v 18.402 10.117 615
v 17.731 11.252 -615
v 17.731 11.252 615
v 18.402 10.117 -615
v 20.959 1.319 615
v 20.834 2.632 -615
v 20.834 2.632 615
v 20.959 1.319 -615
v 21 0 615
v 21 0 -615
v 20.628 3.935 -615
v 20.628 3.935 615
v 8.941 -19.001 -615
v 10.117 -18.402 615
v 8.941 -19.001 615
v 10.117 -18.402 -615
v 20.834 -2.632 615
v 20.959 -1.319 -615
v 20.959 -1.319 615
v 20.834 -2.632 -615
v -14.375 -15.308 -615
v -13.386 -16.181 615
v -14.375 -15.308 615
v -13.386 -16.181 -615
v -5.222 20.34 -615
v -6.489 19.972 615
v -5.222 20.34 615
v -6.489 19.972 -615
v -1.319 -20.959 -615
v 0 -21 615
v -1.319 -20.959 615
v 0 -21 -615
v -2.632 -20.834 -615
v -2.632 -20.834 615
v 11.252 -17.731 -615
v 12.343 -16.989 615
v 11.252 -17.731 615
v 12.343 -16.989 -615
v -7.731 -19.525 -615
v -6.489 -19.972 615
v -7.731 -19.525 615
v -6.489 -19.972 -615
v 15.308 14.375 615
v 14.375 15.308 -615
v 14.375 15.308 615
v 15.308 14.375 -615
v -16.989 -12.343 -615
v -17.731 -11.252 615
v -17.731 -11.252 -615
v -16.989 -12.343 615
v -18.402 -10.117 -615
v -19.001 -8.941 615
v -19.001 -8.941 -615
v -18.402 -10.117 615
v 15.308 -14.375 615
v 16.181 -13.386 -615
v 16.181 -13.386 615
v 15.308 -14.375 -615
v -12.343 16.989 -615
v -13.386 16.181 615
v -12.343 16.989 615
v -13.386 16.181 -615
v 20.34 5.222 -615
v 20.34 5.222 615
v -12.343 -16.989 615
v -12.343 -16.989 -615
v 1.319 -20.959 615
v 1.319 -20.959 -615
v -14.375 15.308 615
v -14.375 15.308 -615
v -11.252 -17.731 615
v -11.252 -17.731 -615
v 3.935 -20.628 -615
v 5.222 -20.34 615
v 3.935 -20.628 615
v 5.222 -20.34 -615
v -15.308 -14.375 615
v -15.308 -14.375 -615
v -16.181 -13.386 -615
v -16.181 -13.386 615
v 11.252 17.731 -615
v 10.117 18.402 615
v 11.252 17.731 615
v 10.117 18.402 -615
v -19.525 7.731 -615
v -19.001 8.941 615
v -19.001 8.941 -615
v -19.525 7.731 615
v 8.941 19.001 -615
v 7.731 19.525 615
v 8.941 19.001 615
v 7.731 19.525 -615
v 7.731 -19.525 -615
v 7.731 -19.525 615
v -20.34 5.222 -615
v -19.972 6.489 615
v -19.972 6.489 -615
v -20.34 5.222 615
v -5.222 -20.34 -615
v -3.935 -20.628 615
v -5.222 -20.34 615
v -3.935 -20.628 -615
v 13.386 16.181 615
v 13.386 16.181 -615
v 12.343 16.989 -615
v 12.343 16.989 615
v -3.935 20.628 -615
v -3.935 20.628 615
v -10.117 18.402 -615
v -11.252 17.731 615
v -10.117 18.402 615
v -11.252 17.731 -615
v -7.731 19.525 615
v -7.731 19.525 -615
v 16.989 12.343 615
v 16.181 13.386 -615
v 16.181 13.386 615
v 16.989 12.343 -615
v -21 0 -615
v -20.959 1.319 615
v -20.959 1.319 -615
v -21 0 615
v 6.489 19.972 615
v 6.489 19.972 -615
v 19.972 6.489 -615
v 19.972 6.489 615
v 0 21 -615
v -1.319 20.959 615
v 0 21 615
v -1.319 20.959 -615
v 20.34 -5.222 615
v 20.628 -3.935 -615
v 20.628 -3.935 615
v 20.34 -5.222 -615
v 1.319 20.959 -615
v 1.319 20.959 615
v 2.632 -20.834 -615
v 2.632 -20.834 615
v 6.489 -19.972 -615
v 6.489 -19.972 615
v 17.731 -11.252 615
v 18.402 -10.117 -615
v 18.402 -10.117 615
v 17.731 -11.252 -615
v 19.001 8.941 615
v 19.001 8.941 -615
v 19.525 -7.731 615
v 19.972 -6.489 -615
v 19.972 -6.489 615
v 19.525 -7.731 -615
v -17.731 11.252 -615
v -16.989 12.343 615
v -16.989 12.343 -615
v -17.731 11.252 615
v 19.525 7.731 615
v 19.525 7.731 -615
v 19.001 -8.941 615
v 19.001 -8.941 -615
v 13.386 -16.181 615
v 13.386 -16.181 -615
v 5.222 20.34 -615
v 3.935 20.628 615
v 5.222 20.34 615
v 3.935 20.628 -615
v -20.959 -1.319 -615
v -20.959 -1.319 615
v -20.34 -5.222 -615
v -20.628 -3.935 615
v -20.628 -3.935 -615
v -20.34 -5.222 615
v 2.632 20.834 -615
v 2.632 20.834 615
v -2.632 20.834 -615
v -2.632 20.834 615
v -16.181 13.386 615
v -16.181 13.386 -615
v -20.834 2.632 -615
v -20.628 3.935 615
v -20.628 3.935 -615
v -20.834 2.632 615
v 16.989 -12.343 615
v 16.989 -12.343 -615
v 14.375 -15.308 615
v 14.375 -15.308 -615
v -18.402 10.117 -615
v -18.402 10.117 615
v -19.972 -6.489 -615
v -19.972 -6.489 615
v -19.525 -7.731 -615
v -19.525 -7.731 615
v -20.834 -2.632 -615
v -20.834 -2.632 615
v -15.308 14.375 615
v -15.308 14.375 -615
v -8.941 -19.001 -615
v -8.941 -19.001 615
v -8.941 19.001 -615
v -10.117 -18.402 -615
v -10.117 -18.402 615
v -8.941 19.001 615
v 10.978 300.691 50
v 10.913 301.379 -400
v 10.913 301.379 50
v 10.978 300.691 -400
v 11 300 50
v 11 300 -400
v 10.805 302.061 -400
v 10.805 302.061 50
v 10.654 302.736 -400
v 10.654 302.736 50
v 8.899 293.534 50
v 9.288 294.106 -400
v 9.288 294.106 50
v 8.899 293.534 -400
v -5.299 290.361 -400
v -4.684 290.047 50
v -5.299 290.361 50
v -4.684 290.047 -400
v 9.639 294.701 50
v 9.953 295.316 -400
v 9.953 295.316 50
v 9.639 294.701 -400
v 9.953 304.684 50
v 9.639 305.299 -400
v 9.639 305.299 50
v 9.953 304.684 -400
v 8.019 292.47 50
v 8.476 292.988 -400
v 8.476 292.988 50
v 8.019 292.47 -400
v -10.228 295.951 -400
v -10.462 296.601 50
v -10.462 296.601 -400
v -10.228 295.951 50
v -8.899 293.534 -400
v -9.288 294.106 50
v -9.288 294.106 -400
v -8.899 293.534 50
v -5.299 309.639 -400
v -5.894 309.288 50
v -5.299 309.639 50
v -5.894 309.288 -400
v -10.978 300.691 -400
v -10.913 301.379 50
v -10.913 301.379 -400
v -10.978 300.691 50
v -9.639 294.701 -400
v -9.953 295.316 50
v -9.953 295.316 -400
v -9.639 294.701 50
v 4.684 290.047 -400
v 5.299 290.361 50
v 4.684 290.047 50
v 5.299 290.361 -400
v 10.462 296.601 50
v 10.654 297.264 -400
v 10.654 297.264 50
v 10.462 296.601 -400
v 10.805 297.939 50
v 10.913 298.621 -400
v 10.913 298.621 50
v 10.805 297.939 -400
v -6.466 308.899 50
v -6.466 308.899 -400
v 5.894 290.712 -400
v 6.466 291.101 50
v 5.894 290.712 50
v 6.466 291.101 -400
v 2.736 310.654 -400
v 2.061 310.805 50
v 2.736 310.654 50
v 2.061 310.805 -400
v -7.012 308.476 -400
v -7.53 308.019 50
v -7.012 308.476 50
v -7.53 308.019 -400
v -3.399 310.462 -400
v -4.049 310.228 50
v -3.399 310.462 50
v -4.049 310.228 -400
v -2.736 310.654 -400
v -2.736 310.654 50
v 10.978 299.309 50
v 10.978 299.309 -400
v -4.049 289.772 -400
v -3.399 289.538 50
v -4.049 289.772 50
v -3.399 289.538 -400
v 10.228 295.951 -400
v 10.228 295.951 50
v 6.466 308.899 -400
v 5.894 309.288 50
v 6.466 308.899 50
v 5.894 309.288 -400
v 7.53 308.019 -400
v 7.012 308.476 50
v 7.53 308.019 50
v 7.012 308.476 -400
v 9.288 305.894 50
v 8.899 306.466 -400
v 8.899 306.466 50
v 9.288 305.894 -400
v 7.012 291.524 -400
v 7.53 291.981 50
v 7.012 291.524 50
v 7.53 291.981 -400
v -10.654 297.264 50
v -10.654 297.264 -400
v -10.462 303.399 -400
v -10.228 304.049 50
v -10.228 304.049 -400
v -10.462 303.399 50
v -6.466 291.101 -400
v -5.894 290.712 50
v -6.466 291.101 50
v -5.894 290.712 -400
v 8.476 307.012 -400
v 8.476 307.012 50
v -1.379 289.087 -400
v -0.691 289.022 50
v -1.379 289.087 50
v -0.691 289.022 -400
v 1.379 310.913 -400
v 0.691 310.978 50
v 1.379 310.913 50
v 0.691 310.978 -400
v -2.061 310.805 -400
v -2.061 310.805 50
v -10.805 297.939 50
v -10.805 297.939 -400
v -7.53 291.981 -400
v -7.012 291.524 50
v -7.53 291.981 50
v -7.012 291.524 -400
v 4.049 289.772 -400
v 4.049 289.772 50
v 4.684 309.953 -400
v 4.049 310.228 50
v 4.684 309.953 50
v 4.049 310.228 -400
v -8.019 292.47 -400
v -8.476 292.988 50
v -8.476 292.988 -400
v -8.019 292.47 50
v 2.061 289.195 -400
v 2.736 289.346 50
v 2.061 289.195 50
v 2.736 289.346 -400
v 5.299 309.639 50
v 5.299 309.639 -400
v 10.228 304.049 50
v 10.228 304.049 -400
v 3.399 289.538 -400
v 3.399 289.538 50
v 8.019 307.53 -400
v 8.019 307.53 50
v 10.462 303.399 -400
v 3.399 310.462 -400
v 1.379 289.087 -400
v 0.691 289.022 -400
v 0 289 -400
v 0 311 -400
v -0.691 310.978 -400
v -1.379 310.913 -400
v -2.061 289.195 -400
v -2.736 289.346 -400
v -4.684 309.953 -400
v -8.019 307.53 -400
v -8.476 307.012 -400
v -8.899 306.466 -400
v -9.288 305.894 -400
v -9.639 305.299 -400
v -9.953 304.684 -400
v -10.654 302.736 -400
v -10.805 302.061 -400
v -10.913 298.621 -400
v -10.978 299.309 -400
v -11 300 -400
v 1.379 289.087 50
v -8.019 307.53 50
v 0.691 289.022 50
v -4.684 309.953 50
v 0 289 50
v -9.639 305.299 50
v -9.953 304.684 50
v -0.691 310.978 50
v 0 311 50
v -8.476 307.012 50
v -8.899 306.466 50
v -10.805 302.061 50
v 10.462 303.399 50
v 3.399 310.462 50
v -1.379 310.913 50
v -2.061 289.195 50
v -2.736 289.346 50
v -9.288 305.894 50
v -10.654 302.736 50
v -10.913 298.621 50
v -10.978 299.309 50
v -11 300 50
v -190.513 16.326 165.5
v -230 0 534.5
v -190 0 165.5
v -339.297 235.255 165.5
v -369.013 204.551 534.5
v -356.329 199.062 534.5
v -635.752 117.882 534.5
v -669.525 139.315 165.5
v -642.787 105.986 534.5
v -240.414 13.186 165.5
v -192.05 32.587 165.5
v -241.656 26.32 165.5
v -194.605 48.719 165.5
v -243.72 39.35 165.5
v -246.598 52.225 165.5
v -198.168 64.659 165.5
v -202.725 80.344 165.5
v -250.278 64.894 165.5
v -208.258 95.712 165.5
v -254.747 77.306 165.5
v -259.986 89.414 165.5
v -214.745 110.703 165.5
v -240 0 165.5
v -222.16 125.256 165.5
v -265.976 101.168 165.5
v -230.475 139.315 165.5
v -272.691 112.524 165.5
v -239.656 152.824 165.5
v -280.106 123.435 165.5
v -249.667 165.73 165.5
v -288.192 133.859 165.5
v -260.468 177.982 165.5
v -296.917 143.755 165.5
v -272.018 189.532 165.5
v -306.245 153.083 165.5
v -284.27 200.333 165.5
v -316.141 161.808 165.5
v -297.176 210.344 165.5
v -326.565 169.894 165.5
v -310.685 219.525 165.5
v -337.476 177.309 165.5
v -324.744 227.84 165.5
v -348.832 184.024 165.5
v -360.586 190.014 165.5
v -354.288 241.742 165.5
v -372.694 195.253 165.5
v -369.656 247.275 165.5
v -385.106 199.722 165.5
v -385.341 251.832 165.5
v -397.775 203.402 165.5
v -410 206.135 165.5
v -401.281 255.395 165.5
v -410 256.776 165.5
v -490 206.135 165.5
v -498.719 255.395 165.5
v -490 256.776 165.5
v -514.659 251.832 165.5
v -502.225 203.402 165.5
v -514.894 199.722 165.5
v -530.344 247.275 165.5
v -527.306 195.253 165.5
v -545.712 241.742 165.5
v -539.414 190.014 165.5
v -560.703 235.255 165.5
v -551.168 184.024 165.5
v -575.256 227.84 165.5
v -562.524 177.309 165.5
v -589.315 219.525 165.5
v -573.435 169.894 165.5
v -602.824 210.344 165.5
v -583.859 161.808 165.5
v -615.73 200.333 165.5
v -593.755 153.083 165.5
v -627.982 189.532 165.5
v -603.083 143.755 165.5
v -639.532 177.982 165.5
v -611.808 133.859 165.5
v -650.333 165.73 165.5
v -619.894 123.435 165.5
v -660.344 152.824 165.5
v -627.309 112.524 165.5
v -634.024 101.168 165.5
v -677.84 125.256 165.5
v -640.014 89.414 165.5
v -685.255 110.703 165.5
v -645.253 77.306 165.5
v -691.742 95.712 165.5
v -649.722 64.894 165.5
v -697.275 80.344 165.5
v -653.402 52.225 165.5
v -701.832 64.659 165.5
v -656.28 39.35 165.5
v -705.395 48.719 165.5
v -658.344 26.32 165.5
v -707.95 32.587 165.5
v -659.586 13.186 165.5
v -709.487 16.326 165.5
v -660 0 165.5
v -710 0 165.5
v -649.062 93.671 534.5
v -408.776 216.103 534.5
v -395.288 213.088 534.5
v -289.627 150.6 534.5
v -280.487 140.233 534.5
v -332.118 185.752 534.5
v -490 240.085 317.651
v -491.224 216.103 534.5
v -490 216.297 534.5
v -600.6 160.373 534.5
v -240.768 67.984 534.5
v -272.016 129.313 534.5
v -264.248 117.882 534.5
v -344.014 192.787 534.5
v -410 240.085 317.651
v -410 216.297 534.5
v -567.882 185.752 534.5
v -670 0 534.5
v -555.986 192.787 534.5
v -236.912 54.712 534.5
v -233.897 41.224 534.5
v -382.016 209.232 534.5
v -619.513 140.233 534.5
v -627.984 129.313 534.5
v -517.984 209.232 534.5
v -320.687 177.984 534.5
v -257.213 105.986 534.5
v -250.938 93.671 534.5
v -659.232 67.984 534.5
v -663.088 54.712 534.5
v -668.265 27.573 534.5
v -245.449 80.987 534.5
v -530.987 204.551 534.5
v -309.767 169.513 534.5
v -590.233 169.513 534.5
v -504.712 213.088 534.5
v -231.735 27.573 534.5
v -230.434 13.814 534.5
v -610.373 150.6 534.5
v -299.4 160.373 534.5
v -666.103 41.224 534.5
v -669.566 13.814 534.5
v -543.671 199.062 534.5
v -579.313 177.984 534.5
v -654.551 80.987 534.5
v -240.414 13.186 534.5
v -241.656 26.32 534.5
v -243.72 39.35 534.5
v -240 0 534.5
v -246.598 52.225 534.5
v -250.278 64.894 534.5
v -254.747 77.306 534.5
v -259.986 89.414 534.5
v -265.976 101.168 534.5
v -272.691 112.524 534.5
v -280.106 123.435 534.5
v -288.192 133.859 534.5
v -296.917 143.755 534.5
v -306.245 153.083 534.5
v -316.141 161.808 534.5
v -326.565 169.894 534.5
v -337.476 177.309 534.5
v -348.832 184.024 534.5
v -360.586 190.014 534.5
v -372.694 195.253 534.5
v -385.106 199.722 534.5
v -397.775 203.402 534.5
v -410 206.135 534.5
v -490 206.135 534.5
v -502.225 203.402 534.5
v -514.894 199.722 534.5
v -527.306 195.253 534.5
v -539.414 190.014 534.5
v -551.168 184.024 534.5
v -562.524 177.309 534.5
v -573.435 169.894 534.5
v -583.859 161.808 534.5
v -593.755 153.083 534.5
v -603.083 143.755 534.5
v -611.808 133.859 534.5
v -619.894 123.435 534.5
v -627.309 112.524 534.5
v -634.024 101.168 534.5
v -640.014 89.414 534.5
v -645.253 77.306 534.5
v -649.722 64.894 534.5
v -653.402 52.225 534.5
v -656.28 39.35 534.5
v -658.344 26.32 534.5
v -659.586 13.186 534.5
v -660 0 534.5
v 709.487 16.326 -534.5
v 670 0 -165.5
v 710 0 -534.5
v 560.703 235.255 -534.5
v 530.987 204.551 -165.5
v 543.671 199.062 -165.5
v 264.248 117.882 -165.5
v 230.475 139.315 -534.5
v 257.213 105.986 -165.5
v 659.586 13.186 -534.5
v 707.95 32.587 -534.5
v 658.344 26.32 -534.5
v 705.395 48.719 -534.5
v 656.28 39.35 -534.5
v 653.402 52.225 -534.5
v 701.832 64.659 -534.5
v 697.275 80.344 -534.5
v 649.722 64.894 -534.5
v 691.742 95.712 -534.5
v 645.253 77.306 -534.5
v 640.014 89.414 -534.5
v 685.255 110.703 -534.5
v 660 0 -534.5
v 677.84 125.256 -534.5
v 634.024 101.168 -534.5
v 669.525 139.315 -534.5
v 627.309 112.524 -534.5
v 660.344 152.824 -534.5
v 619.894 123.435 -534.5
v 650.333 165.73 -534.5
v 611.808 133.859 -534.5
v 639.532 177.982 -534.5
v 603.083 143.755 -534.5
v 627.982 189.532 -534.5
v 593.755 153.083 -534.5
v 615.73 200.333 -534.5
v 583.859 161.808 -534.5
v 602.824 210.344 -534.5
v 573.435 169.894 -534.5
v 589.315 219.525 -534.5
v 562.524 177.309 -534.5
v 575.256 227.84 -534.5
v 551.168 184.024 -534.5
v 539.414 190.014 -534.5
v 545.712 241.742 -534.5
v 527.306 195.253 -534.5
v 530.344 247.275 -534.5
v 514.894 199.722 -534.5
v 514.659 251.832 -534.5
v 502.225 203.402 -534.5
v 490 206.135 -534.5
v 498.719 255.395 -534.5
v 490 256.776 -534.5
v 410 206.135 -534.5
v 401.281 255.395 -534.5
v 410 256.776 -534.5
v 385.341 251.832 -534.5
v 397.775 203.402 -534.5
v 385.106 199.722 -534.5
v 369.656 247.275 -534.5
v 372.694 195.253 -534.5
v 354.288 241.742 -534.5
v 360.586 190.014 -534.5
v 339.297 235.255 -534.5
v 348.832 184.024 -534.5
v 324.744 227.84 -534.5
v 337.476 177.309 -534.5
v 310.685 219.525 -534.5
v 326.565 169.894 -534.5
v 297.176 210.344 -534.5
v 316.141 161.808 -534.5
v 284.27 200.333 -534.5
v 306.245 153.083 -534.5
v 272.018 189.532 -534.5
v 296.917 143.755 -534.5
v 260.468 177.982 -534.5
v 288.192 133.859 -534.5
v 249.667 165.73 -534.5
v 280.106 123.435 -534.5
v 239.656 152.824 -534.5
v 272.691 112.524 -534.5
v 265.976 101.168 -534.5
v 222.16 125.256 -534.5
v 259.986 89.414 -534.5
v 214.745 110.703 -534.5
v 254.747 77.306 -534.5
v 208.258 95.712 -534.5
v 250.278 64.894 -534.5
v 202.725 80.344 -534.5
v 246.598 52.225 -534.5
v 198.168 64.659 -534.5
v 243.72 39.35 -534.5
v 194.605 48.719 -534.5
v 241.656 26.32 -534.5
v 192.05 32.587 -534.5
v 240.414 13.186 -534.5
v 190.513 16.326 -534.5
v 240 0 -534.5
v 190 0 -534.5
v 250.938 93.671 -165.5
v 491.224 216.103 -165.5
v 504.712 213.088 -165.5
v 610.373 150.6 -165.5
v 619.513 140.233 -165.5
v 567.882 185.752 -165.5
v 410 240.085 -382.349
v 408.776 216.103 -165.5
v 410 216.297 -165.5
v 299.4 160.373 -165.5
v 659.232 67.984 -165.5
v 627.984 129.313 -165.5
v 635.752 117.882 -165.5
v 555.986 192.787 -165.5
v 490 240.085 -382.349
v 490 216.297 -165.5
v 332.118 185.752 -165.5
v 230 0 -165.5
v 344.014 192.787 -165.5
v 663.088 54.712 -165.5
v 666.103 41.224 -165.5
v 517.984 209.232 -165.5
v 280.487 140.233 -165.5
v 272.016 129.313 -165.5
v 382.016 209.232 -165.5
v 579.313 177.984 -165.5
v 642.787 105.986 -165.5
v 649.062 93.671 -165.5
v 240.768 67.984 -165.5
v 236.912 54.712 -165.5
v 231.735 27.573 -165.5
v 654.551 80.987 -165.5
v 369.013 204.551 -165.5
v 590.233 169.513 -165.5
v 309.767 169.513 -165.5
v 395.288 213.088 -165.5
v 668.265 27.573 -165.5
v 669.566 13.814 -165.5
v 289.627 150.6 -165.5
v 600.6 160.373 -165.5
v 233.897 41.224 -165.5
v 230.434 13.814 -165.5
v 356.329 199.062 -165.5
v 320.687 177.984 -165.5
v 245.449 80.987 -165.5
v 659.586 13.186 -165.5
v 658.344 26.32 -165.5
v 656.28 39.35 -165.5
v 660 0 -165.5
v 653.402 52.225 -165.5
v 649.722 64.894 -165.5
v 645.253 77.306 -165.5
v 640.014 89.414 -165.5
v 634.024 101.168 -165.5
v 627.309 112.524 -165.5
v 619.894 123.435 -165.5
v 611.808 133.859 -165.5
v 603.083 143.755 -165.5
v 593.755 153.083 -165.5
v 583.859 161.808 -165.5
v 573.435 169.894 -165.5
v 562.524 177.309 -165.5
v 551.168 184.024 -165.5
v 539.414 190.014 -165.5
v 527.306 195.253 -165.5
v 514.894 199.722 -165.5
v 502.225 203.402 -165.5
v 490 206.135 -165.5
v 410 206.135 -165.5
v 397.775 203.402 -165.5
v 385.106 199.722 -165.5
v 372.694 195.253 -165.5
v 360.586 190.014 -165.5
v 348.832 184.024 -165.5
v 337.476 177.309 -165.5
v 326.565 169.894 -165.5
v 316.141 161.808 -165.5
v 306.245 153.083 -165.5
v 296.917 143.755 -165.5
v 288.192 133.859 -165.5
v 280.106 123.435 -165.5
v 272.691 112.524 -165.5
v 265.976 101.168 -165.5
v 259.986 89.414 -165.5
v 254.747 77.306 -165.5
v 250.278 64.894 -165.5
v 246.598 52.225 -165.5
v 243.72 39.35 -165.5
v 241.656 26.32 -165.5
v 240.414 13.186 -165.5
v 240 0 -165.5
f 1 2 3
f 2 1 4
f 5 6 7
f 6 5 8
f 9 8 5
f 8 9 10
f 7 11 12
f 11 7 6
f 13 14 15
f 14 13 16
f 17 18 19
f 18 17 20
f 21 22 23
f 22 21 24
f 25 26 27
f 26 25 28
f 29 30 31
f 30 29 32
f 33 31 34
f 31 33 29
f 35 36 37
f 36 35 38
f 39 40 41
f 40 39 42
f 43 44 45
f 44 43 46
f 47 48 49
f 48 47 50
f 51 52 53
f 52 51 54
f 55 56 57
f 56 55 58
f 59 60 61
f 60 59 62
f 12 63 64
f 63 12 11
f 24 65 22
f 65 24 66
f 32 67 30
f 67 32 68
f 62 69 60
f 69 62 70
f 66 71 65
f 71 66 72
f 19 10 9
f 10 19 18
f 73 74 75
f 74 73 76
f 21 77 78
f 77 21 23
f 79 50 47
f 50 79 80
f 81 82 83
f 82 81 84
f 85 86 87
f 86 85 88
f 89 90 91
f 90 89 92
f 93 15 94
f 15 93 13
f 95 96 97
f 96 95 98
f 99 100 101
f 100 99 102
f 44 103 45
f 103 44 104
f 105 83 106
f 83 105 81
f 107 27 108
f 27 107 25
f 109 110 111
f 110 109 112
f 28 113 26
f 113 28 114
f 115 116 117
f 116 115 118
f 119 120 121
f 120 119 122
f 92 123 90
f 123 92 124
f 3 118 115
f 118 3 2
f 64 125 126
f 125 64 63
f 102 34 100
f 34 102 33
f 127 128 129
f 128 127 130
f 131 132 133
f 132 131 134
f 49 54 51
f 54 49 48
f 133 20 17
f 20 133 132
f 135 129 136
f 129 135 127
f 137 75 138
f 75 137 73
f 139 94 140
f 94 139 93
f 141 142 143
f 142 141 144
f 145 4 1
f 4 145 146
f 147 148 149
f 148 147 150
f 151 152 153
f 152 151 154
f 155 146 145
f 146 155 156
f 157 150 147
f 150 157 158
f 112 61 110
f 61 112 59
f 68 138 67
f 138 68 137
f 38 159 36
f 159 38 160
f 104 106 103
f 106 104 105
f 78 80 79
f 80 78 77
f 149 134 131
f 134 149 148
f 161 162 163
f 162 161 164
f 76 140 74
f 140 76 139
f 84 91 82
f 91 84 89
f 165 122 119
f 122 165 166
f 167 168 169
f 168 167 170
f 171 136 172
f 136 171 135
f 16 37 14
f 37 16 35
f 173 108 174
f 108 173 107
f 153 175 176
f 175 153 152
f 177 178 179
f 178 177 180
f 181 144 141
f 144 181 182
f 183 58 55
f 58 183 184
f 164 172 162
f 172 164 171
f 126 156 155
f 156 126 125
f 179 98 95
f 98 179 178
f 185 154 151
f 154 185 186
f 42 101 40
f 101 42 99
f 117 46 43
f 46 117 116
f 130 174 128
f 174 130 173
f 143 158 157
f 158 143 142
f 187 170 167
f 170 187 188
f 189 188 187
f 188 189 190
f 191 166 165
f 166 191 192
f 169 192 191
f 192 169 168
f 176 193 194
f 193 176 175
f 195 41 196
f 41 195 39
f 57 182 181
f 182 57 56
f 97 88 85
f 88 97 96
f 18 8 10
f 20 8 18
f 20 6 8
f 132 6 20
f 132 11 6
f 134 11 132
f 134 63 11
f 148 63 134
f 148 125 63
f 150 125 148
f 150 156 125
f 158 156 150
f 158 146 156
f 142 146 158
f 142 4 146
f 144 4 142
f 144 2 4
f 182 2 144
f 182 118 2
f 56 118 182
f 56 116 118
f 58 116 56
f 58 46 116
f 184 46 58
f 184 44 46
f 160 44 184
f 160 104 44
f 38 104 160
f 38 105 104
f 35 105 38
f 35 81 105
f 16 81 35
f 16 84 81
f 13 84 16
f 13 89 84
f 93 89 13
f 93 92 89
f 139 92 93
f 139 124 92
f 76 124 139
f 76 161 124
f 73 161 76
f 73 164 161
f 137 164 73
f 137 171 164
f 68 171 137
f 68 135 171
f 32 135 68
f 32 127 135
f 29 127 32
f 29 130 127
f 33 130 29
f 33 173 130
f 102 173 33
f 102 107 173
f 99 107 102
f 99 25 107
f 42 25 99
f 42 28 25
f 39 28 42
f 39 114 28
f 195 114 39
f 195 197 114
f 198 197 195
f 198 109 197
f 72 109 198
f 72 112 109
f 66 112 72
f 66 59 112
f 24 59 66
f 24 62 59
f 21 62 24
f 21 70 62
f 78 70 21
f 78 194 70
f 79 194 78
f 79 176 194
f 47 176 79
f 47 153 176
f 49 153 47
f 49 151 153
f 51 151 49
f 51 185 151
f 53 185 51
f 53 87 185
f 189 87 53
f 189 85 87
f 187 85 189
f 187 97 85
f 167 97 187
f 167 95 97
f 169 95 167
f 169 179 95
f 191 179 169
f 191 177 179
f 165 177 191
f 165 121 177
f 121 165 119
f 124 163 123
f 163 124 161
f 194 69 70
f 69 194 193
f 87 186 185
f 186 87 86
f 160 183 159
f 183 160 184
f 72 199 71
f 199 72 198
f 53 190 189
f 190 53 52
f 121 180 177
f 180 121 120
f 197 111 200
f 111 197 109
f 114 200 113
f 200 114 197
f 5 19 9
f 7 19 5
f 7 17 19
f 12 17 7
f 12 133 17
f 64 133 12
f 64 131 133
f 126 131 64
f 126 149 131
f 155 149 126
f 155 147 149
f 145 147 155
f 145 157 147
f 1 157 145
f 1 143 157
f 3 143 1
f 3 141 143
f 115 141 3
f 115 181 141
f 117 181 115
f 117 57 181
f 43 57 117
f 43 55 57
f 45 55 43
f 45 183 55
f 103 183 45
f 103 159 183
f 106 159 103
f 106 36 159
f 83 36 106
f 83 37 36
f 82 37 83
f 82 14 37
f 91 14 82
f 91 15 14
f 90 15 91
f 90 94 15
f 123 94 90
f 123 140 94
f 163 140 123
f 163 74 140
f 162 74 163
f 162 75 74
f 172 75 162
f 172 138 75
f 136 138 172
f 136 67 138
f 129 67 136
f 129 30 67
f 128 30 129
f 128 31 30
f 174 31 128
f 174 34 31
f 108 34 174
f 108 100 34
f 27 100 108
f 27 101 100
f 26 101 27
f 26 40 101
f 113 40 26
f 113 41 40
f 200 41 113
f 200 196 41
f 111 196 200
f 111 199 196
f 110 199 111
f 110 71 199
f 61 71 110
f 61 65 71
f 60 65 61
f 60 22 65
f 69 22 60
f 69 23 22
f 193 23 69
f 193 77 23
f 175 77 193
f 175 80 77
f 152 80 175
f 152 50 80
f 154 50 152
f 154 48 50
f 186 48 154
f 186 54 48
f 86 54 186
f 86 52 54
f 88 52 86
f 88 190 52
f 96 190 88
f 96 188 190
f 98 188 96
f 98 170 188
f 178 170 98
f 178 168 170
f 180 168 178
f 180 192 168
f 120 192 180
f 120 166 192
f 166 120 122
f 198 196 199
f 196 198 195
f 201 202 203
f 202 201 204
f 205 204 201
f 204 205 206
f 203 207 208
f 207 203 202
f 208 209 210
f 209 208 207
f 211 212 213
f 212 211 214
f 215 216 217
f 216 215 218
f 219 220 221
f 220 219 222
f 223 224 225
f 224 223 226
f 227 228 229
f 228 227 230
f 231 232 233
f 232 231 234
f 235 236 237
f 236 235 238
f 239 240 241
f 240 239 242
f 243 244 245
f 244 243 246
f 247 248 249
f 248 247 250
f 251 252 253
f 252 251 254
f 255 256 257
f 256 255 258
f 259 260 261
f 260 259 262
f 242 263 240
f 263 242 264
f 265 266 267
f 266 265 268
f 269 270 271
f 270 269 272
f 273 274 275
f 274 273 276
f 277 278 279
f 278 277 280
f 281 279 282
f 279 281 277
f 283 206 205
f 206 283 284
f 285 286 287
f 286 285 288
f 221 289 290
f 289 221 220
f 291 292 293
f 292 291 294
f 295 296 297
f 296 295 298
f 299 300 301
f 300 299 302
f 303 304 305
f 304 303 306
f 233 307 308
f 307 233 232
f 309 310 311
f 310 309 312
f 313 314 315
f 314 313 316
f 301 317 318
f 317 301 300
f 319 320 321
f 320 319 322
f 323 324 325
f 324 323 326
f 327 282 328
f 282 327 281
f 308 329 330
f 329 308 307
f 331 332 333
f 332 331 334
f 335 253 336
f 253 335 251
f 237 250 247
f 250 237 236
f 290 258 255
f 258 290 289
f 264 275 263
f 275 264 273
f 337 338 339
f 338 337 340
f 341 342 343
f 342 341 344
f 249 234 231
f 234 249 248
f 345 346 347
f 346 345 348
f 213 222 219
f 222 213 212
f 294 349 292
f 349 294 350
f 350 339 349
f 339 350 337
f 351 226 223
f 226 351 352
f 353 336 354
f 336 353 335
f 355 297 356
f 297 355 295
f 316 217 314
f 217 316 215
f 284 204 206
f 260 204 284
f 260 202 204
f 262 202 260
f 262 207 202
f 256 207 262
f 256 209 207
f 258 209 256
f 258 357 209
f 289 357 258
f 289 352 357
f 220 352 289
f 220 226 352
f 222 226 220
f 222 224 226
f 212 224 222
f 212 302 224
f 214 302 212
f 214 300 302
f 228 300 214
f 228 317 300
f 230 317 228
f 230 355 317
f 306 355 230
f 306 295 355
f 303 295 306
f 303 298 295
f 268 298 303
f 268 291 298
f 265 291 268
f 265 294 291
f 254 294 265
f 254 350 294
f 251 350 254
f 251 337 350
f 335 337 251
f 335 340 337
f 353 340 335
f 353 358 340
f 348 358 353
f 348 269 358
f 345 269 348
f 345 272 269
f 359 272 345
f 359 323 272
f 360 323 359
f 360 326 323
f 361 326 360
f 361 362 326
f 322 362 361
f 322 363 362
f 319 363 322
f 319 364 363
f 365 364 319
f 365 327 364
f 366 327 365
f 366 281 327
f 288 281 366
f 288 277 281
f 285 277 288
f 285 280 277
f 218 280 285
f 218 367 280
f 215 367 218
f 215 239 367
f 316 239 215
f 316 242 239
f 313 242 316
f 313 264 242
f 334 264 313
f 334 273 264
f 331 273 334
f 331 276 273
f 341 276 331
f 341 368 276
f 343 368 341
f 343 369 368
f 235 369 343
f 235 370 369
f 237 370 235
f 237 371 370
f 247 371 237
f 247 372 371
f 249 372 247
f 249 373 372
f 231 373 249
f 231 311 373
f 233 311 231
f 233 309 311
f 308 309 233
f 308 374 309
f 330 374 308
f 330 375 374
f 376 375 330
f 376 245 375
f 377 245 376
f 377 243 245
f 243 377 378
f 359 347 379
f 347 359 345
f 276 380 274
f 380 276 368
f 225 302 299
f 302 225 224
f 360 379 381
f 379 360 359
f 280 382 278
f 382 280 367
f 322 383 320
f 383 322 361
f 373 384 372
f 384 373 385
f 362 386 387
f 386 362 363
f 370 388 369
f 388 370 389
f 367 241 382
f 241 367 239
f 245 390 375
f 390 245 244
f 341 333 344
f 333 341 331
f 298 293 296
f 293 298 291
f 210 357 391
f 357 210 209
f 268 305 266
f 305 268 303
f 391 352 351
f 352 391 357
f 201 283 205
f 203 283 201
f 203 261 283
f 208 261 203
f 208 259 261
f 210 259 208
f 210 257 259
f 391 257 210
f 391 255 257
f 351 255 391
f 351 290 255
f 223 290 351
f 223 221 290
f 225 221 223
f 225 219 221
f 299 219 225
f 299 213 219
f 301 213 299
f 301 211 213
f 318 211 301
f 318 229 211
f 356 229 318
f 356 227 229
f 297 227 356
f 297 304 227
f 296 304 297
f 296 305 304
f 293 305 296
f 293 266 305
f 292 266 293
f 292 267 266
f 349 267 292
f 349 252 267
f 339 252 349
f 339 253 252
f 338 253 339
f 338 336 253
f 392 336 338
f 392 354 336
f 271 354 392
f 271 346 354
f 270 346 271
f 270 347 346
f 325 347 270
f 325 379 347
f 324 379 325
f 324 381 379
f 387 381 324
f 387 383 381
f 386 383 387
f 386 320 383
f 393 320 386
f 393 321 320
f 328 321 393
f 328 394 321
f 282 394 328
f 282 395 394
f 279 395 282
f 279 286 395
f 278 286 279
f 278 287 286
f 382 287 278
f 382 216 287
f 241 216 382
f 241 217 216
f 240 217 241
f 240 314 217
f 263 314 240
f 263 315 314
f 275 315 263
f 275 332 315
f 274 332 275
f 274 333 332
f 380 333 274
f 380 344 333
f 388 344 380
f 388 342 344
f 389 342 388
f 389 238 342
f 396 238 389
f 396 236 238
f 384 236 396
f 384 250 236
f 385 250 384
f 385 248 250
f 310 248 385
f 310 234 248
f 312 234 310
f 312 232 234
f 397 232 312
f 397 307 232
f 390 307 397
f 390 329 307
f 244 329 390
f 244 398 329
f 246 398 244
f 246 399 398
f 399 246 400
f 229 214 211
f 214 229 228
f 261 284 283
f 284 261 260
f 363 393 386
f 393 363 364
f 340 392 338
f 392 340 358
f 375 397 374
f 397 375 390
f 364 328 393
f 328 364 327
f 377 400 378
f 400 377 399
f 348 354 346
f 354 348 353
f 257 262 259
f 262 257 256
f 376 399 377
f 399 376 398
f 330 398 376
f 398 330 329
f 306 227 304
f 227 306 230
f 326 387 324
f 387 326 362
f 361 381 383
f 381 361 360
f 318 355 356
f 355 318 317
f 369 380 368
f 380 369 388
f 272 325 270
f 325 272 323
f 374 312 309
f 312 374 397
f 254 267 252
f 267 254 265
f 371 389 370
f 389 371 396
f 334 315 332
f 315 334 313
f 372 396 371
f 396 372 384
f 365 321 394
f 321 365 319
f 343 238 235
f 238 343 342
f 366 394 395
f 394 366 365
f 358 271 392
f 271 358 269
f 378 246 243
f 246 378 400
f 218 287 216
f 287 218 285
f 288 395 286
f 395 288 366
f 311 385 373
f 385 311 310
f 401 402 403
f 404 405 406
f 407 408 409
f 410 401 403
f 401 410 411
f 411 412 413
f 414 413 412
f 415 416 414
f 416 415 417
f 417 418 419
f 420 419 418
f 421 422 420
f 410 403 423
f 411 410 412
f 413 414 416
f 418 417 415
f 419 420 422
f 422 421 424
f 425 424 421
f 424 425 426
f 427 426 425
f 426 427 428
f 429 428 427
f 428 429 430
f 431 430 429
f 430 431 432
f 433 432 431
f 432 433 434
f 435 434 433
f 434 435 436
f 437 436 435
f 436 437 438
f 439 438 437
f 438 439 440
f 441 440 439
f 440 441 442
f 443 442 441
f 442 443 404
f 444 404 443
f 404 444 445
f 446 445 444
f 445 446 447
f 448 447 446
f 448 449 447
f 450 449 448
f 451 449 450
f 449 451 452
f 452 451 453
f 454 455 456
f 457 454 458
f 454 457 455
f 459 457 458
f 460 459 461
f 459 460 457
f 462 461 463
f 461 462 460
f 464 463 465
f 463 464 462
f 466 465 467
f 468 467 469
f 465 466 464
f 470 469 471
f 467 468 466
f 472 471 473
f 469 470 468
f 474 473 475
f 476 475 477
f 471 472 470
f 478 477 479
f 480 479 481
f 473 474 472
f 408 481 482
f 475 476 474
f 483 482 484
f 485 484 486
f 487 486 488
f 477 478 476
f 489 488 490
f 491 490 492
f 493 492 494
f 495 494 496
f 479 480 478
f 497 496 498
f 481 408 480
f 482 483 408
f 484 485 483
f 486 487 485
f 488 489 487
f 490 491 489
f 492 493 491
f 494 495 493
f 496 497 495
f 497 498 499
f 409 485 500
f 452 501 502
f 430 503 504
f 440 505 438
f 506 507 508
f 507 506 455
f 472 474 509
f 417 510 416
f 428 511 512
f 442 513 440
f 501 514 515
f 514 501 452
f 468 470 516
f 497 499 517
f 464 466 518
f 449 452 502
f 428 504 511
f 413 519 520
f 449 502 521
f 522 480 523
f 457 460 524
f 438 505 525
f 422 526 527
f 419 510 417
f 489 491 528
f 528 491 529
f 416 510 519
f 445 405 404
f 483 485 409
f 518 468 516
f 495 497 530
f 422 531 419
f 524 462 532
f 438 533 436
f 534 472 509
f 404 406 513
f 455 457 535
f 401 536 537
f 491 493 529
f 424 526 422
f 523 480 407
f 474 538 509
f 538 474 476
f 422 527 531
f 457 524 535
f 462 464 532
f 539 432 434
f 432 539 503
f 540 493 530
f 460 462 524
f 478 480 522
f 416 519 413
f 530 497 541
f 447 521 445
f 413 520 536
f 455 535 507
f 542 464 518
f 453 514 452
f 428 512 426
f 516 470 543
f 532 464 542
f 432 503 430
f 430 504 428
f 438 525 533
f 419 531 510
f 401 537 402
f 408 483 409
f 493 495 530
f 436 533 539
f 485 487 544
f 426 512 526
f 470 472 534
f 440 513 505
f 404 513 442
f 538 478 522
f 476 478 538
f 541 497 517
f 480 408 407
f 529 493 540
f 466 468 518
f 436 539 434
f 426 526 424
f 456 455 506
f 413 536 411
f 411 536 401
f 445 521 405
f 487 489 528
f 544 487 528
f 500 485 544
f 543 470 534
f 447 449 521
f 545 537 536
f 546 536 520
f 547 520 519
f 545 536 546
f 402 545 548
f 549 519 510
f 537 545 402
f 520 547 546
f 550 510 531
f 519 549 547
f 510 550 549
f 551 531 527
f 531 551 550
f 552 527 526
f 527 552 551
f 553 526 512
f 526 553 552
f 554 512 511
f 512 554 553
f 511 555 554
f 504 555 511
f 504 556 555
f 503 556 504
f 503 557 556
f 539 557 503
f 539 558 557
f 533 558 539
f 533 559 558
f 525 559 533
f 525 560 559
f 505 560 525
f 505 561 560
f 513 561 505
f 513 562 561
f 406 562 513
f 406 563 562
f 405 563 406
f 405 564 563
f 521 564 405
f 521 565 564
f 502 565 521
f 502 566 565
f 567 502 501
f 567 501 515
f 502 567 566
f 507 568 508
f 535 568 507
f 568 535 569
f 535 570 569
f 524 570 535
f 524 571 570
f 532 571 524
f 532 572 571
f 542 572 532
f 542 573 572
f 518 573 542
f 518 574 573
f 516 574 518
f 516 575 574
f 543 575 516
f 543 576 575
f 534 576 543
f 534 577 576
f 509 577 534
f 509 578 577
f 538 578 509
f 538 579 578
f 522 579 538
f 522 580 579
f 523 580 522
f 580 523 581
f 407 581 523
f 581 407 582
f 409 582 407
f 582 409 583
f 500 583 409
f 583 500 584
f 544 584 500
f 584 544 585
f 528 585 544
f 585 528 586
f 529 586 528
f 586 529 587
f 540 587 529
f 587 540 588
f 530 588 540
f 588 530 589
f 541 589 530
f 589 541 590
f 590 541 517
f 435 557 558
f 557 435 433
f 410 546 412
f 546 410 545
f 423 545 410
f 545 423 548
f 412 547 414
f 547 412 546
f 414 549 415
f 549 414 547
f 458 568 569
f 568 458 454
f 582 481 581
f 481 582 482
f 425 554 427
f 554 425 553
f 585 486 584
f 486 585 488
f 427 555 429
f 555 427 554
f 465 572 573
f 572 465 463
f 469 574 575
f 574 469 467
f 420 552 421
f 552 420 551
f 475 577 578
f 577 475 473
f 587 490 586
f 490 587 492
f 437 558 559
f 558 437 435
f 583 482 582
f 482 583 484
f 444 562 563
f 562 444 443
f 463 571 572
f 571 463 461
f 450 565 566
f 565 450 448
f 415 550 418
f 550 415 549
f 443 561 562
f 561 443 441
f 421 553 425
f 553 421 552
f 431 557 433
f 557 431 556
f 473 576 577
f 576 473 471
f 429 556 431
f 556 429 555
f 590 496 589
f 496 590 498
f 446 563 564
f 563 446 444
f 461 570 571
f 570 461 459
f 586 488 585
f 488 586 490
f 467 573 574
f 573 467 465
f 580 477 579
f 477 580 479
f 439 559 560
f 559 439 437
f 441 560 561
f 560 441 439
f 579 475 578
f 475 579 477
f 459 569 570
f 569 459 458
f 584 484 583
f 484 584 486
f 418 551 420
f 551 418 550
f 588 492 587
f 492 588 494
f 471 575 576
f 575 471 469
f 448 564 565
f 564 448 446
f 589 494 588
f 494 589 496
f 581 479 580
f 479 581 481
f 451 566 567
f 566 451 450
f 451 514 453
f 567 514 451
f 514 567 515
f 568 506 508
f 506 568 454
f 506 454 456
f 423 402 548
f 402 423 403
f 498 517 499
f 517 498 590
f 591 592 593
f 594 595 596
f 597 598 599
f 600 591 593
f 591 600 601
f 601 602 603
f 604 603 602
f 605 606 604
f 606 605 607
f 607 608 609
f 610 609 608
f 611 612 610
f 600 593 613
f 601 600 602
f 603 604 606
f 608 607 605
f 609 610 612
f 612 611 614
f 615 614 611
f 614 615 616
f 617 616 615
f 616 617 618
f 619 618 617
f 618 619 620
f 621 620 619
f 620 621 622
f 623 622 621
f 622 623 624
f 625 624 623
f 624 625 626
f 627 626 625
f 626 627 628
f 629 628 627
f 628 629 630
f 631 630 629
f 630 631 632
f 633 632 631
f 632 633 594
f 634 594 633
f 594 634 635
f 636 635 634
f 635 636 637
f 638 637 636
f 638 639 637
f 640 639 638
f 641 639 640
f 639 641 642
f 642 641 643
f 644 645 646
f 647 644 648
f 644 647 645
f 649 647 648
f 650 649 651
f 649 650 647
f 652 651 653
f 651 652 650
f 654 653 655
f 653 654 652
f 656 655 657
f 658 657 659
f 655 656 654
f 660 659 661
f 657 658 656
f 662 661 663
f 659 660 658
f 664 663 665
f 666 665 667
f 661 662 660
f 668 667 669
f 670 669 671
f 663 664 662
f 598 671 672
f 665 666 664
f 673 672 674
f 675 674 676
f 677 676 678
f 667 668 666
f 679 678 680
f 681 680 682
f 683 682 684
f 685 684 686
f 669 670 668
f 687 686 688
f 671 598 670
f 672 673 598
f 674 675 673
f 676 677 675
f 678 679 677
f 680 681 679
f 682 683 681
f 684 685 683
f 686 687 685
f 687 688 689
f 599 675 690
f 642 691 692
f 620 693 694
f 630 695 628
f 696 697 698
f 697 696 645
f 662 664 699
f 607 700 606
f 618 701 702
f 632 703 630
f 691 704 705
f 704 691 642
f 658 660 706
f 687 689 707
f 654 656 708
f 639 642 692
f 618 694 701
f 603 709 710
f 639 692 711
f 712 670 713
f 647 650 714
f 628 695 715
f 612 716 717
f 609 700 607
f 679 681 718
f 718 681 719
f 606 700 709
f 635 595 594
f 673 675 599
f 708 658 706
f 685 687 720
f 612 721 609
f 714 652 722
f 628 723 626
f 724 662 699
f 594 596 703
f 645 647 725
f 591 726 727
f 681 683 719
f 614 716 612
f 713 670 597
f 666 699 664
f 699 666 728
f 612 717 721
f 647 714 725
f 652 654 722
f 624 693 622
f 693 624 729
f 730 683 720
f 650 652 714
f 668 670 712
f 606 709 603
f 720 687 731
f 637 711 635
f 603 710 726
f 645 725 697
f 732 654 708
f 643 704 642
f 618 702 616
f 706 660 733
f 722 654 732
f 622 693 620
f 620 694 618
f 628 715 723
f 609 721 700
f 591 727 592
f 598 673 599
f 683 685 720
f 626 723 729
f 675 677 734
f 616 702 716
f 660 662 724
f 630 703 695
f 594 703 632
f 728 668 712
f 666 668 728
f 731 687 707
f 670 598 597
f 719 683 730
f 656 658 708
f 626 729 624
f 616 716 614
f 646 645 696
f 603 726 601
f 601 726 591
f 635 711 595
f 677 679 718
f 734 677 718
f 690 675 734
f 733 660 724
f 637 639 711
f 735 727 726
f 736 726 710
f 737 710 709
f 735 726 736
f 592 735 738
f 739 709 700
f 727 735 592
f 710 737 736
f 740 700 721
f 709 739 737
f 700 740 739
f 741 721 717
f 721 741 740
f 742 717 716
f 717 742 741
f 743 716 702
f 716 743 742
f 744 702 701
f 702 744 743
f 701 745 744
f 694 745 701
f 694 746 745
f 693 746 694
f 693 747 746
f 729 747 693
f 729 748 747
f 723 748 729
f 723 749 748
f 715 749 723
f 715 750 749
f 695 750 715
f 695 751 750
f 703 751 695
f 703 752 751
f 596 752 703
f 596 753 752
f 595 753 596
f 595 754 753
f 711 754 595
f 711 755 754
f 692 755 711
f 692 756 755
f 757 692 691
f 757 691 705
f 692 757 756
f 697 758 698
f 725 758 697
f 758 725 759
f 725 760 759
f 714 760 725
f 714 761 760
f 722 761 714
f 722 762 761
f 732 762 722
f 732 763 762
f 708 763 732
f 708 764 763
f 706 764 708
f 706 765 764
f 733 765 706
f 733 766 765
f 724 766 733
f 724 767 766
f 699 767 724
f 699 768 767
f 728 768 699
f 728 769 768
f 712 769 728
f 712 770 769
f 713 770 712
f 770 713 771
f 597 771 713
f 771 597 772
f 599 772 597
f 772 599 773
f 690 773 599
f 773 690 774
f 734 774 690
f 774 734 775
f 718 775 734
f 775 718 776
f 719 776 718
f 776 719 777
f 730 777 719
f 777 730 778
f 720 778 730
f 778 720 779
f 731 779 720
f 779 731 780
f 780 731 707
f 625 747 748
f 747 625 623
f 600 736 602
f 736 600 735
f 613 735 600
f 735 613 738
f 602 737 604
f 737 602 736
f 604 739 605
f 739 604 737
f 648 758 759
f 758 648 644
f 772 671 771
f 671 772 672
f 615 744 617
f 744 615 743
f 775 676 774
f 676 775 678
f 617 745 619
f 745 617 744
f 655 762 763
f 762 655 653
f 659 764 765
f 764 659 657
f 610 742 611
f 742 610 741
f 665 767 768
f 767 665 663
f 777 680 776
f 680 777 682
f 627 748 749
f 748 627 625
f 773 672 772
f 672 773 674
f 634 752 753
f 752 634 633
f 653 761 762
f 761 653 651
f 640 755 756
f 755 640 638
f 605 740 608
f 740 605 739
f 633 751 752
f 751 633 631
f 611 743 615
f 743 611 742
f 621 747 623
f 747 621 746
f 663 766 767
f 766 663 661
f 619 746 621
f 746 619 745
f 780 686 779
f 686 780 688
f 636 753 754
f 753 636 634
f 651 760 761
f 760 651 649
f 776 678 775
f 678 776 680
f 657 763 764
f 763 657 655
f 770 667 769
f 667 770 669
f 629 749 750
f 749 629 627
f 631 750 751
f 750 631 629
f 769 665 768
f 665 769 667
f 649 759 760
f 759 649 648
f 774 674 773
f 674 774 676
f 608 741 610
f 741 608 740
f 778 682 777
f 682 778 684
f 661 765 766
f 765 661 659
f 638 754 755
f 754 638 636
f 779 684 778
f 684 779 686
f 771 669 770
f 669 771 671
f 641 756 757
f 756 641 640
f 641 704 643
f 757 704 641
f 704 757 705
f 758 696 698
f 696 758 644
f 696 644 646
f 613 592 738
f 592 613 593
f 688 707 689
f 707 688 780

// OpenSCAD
// ============================================================================
// PROJECT: XXXG-00W0 WING GUNDAM ZERO EW - MANIPULATOR STRUCTURAL CORE
// COMPONENT VAULT: BANDAI CAST RUNNER C - GAUNTLET CUFFS C11 & C12
// PACKAGING RE-ARCHITECTURE: SUB-ARMOR CAPACITOR RECESSED BANK INTEGRATION
// CONFIG METRIC: SCALED TITANIUM CASTS (1:1 ACTUAL METRIC UP-SCALE)
// ============================================================================

$fn = 100; // Circular segment rendering resolution count

// Structural Constants Scaled 1:1 for a 16.7-Meter Airframe Scale (mm)
gauntlet_total_length = 820;             // Total longitudinal vertical height (mm)
gauntlet_outer_diameter = 440;           // Transverse arm sleeve casing depth (mm)
armor_skin_thickness = 50;              // Solid TiAl protective plating wall (mm)
harness_conduit_width = 80;             // Cast-in 4oz copper logic trace track (mm)
capacitor_pocket_depth = 15;            // Sub-armor recessed housing pocket depth (mm)
capacitor_pocket_width = 140;           // Transverse MLCC array pocket width (mm)

module Runner_C_Gauntlet_Cuff_Forge() {
    // Central Supply Injection Runner Axis (Molten Feed Line from Siphon Forge)
    color([0.22, 0.22, 0.24]) {
        cylinder(h = gauntlet_total_length * 1.5, d = 42, center = true);
        // Direct injection gates tracking straight into the part mold cavities
        translate() rotate() cylinder(h = 450, d = 22);
        translate([0, 300, -400]) rotate() cylinder(h = 450, d = 22);
    }
    
    // Instantiate Scaled Skeutomorphic Part Molds Symmetrically (Left & Right)
    Cast_Outer_Gauntlet_Cuffs();
}

module Cast_Outer_Gauntlet_Cuffs() {
    // ---- PART C11: OUTER LEFT PROTECTIVE UPPER FOREARM GAUNTLET CUFF ---- [Page 5, Step 03-3]
    translate([-450, 0, 350]) color([0.2, 0.4, 0.8]) { // Cobalt Blue Accent Spec
        difference() {
            // Main cylindrical contoured weapon docking sleeve casing
            cylinder(h = gauntlet_total_length * 0.45, d1 = gauntlet_outer_diameter + 80, d2 = gauntlet_outer_diameter, center = true);
            
            // Internal channel boring (Fits securely over the sliding forearm armor shell)
            cylinder(h = gauntlet_total_length * 0.5, d = gauntlet_outer_diameter - 20, center = true);
            
            // SUB-ARMOR RECESSED CAPACITOR POCKETS [Segmented rows cut inside the armor inner wall]
            for (z_offset = [-120, 0, 120]) {
                translate([0, (gauntlet_outer_diameter/2 - armor_skin_thickness + capacitor_pocket_depth/2), z_offset])
                    cube([capacitor_pocket_width, capacitor_pocket_depth, 90], center = true);
            }
            
            // Continuous cast-in routing track for the 4oz solid-state wiring rails
            cube([harness_conduit_width, gauntlet_outer_diameter + 100, gauntlet_total_length], center = true);
            
            // Slicing profile tool to generate an asymmetrical half-shell part component
            translate([0, -gauntlet_outer_diameter, 0])
                cube([gauntlet_outer_diameter * 2, gauntlet_outer_diameter * 2, gauntlet_total_length * 2], center = true);
        }
    }
    
    // ---- PART C12: OUTER RIGHT PROTECTIVE UPPER FOREARM GAUNTLET CUFF ---- [Page 5, Step 03-3]
    translate([450, 0, -350]) rotate() color([0.2, 0.4, 0.8]) {
        difference() {
            cylinder(h = gauntlet_total_length * 0.45, d1 = gauntlet_outer_diameter + 80, d2 = gauntlet_outer_diameter, center = true);
            cylinder(h = gauntlet_total_length * 0.5, d = gauntlet_outer_diameter - 20, center = true);
            
            for (z_offset = [-120, 0, 120]) {
                translate([0, (gauntlet_outer_diameter/2 - armor_skin_thickness + capacitor_pocket_depth/2), z_offset])
                    cube([capacitor_pocket_width, capacitor_pocket_depth, 90], center = true);
            }
            
            cube([harness_conduit_width, gauntlet_outer_diameter + 100, gauntlet_total_length], center = true);
            translate([0, -gauntlet_outer_diameter, 0])
                cube([gauntlet_outer_diameter * 2, gauntlet_outer_diameter * 2, gauntlet_total_length * 2], center = true);
        }
    }
}

// Render Master Assembly to Parameter Workspace
Runner_C_Gauntlet_Cuff_Forge();
